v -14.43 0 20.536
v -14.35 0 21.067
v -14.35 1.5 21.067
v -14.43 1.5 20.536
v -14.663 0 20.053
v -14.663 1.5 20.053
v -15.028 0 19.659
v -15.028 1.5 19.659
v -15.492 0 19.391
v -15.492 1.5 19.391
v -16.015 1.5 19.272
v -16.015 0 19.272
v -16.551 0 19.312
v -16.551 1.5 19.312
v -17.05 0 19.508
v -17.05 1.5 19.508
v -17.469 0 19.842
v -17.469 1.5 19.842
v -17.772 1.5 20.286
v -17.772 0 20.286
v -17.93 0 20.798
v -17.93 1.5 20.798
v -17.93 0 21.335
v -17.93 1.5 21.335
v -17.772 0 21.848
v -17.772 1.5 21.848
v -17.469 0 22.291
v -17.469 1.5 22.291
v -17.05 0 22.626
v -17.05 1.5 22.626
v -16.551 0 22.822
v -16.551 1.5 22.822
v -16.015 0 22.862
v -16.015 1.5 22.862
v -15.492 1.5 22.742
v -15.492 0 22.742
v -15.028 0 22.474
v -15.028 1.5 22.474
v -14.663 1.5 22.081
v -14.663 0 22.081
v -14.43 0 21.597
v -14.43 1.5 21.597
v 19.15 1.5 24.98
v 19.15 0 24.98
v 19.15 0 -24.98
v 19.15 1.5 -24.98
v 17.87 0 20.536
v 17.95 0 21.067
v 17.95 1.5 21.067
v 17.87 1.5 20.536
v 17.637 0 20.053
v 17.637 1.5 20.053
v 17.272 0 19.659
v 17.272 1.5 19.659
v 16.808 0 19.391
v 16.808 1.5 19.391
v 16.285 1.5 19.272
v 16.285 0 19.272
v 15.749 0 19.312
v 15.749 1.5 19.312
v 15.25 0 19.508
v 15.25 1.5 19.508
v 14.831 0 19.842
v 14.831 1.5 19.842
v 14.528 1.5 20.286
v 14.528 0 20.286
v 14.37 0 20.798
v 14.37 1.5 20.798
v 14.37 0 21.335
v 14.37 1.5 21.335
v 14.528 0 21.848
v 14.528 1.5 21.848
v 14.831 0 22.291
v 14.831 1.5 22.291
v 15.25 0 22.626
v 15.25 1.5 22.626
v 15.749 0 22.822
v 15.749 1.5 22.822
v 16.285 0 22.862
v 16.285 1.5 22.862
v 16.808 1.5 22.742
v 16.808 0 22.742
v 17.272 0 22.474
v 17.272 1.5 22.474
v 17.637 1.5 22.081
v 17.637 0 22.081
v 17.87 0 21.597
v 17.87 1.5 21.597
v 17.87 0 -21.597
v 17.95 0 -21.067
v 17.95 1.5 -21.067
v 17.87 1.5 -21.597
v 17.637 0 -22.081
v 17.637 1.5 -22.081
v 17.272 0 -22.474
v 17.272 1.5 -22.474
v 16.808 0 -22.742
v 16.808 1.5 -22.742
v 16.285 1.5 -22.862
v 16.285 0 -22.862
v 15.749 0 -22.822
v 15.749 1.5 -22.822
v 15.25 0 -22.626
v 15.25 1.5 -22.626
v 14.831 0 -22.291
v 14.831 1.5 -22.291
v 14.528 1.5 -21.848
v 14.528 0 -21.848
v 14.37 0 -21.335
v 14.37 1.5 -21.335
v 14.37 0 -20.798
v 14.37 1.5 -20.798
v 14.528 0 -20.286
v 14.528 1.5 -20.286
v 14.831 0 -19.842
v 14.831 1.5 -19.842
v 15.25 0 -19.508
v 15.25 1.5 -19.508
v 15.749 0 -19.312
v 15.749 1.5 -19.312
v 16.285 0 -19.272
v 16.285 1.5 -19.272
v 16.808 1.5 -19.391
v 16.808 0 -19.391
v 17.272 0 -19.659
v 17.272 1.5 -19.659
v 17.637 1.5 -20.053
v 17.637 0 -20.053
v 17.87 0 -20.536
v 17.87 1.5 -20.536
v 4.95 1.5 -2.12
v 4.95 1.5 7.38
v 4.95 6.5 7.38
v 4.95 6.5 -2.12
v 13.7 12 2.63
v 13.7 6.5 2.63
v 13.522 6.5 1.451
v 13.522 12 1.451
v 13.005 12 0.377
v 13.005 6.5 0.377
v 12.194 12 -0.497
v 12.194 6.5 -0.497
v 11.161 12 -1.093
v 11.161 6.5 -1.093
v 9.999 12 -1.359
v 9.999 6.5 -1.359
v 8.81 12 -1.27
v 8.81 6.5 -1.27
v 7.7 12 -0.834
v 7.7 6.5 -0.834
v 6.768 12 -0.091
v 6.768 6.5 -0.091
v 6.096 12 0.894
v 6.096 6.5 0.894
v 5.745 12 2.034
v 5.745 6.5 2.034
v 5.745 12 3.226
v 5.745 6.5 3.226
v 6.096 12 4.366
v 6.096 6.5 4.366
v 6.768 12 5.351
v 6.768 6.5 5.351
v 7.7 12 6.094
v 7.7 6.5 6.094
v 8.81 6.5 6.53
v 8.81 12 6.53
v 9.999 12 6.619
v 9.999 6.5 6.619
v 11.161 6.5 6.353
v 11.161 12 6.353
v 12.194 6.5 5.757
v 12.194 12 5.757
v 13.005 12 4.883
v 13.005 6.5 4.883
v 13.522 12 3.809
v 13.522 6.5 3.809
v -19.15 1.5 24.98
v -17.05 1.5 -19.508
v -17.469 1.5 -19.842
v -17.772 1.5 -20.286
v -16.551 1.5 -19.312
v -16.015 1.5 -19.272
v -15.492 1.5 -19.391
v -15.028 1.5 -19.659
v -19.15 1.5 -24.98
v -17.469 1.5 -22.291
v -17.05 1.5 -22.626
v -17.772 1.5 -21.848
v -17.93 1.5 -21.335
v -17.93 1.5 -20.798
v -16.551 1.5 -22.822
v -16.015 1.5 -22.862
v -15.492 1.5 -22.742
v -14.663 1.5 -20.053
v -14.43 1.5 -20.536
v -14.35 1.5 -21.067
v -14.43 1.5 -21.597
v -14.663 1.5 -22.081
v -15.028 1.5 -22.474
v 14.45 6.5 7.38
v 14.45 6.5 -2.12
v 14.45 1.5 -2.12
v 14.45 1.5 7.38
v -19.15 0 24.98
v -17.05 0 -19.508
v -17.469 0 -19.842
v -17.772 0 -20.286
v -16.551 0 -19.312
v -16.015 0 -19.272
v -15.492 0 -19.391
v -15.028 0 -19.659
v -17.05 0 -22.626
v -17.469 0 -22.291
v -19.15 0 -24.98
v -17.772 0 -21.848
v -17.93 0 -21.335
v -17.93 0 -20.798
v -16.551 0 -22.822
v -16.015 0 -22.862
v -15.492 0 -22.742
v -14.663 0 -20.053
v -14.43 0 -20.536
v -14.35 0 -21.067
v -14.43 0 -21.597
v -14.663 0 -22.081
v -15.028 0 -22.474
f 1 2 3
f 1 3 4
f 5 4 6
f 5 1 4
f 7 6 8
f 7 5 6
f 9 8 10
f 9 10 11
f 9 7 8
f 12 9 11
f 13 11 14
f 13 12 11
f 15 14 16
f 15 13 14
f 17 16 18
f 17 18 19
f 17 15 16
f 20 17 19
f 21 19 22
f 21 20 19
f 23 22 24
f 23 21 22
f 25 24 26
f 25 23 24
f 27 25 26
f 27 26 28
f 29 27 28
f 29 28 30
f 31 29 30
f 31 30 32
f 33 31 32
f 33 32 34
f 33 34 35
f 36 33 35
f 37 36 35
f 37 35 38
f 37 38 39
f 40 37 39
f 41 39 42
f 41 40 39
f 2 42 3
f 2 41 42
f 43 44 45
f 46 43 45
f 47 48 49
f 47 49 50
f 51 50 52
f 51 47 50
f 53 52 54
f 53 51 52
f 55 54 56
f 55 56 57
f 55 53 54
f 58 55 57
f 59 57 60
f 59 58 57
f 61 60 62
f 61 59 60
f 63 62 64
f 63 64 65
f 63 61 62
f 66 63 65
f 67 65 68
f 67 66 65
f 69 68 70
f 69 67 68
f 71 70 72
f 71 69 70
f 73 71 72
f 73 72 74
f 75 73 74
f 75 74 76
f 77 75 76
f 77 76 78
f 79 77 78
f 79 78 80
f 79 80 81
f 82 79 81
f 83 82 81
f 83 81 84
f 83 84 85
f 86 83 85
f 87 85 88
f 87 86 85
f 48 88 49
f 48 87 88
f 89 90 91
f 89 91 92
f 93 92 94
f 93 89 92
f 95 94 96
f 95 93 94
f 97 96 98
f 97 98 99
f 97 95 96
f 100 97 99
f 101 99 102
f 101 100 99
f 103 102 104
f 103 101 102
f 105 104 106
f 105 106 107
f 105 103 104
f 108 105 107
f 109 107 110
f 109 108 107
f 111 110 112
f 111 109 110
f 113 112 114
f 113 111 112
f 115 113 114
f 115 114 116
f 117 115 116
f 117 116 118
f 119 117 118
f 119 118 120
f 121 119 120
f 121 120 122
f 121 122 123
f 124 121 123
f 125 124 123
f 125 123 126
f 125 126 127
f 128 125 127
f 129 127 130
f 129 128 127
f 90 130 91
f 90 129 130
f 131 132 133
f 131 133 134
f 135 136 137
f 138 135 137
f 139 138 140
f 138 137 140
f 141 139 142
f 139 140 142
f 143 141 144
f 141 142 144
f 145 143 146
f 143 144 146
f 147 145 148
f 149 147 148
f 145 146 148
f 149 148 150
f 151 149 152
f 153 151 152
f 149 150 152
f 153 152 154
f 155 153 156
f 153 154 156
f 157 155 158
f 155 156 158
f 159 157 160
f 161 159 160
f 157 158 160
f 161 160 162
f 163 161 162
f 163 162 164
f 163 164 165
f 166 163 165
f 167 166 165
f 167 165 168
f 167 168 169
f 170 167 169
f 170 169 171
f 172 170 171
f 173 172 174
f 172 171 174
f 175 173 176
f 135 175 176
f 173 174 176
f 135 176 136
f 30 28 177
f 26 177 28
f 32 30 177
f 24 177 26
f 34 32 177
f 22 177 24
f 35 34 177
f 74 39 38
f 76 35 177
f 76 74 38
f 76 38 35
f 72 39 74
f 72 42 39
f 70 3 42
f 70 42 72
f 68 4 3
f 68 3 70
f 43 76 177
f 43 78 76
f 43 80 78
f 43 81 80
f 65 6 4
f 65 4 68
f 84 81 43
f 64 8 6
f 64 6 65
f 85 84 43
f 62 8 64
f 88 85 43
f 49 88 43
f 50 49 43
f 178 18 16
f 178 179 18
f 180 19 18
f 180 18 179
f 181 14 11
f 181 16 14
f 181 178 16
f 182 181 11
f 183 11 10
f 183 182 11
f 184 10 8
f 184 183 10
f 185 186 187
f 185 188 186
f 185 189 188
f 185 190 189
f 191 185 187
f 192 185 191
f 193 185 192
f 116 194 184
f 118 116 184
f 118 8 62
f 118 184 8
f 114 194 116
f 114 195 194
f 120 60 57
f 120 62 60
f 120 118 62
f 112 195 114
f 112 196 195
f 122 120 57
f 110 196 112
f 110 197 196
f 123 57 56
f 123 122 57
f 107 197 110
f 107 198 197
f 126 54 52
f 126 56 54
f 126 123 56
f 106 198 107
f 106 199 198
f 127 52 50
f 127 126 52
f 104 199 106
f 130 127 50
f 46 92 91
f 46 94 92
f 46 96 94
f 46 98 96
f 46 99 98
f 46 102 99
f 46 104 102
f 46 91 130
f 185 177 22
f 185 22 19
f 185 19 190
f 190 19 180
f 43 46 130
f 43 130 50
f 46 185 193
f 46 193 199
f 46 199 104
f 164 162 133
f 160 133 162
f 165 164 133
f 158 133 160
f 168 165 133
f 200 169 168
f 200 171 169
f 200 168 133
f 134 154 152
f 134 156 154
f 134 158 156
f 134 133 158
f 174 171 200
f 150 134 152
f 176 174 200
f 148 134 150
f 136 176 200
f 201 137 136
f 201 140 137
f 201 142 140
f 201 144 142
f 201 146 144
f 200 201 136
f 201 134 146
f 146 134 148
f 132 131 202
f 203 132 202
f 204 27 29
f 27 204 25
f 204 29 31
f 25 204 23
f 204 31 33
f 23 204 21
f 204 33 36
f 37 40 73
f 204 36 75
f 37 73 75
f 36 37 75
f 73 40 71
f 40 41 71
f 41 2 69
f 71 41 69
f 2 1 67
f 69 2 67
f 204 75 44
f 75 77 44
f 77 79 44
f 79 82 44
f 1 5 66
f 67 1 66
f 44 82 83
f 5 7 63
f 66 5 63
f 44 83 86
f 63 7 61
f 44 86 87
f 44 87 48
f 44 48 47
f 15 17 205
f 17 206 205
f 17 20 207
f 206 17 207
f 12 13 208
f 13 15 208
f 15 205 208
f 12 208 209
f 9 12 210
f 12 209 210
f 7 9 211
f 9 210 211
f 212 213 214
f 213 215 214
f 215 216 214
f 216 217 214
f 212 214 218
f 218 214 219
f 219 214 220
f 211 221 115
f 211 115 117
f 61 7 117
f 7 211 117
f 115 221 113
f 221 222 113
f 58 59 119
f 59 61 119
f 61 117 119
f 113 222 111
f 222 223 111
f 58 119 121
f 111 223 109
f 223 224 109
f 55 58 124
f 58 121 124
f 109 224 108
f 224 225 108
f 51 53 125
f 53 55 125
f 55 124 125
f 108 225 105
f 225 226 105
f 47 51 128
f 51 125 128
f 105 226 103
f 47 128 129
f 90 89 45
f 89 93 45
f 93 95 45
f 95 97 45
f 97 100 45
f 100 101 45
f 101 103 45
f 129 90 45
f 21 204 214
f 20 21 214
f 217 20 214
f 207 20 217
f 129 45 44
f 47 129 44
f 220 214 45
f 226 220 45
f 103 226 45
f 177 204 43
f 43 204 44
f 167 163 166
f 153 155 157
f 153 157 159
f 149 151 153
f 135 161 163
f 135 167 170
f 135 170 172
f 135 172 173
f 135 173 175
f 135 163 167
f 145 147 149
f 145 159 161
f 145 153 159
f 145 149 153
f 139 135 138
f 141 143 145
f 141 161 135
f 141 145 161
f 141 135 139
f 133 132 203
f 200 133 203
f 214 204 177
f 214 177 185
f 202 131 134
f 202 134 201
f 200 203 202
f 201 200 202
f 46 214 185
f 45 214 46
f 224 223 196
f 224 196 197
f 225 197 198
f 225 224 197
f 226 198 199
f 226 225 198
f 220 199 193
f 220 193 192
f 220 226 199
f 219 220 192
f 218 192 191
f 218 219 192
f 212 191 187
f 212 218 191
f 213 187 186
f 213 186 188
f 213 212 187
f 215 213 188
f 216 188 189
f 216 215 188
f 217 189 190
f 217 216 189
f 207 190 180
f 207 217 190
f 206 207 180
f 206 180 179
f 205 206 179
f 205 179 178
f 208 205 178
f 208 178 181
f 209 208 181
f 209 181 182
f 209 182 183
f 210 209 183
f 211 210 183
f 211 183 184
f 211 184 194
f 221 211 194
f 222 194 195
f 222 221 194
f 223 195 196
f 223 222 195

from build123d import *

# Parameters (mm, degrees)
SKETCH1_W           = 38.3
SKETCH1_H           = 49.96
SKETCH1_R           = 1.8
BOSS_EXTRUDE1_DEPTH = 1.5
SKETCH3_W           = 9.5
SKETCH3_H           = 9.5
BOSS_EXTRUDE2_DEPTH = 5
SKETCH5_R           = 4
BOSS_EXTRUDE3_DEPTH = 5.5


with BuildPart() as part:
    # Sketch1 → Boss-Extrude1 (new body)
    with BuildSketch(Plane(origin=(0, 0, 0), x_dir=(1, 0, 0), z_dir=(0, 1, 0))):
        Rectangle(SKETCH1_W, SKETCH1_H)
        with Locations((-16.15, 21.066684073)):
            Circle(SKETCH1_R, mode=Mode.SUBTRACT)
        with Locations((16.15, 21.066684073)):
            Circle(SKETCH1_R, mode=Mode.SUBTRACT)
        with Locations((-16.15, -21.066684073)):
            Circle(SKETCH1_R, mode=Mode.SUBTRACT)
        with Locations((16.15, -21.066684073)):
            Circle(SKETCH1_R, mode=Mode.SUBTRACT)
    extrude(amount=BOSS_EXTRUDE1_DEPTH)


with BuildPart() as body_2:
    # Sketch3 → Boss-Extrude2 (new body)
    with BuildSketch(Plane(origin=(0, 1.5, 0), x_dir=(1, 0, 0), z_dir=(0, 1, 0))):
        with Locations((9.7, -2.63)):
            Rectangle(SKETCH3_W, SKETCH3_H)
    extrude(amount=BOSS_EXTRUDE2_DEPTH)

    # Sketch5 → Boss-Extrude3 (add)
    with BuildSketch(Plane(origin=(0, 6.5, 0), x_dir=(1, 0, 0), z_dir=(0, 1, 0))):
        with Locations((9.7, -2.63)):
            Circle(SKETCH5_R)
    extrude(amount=BOSS_EXTRUDE3_DEPTH)


solid = Compound([part.part, body_2.part])
